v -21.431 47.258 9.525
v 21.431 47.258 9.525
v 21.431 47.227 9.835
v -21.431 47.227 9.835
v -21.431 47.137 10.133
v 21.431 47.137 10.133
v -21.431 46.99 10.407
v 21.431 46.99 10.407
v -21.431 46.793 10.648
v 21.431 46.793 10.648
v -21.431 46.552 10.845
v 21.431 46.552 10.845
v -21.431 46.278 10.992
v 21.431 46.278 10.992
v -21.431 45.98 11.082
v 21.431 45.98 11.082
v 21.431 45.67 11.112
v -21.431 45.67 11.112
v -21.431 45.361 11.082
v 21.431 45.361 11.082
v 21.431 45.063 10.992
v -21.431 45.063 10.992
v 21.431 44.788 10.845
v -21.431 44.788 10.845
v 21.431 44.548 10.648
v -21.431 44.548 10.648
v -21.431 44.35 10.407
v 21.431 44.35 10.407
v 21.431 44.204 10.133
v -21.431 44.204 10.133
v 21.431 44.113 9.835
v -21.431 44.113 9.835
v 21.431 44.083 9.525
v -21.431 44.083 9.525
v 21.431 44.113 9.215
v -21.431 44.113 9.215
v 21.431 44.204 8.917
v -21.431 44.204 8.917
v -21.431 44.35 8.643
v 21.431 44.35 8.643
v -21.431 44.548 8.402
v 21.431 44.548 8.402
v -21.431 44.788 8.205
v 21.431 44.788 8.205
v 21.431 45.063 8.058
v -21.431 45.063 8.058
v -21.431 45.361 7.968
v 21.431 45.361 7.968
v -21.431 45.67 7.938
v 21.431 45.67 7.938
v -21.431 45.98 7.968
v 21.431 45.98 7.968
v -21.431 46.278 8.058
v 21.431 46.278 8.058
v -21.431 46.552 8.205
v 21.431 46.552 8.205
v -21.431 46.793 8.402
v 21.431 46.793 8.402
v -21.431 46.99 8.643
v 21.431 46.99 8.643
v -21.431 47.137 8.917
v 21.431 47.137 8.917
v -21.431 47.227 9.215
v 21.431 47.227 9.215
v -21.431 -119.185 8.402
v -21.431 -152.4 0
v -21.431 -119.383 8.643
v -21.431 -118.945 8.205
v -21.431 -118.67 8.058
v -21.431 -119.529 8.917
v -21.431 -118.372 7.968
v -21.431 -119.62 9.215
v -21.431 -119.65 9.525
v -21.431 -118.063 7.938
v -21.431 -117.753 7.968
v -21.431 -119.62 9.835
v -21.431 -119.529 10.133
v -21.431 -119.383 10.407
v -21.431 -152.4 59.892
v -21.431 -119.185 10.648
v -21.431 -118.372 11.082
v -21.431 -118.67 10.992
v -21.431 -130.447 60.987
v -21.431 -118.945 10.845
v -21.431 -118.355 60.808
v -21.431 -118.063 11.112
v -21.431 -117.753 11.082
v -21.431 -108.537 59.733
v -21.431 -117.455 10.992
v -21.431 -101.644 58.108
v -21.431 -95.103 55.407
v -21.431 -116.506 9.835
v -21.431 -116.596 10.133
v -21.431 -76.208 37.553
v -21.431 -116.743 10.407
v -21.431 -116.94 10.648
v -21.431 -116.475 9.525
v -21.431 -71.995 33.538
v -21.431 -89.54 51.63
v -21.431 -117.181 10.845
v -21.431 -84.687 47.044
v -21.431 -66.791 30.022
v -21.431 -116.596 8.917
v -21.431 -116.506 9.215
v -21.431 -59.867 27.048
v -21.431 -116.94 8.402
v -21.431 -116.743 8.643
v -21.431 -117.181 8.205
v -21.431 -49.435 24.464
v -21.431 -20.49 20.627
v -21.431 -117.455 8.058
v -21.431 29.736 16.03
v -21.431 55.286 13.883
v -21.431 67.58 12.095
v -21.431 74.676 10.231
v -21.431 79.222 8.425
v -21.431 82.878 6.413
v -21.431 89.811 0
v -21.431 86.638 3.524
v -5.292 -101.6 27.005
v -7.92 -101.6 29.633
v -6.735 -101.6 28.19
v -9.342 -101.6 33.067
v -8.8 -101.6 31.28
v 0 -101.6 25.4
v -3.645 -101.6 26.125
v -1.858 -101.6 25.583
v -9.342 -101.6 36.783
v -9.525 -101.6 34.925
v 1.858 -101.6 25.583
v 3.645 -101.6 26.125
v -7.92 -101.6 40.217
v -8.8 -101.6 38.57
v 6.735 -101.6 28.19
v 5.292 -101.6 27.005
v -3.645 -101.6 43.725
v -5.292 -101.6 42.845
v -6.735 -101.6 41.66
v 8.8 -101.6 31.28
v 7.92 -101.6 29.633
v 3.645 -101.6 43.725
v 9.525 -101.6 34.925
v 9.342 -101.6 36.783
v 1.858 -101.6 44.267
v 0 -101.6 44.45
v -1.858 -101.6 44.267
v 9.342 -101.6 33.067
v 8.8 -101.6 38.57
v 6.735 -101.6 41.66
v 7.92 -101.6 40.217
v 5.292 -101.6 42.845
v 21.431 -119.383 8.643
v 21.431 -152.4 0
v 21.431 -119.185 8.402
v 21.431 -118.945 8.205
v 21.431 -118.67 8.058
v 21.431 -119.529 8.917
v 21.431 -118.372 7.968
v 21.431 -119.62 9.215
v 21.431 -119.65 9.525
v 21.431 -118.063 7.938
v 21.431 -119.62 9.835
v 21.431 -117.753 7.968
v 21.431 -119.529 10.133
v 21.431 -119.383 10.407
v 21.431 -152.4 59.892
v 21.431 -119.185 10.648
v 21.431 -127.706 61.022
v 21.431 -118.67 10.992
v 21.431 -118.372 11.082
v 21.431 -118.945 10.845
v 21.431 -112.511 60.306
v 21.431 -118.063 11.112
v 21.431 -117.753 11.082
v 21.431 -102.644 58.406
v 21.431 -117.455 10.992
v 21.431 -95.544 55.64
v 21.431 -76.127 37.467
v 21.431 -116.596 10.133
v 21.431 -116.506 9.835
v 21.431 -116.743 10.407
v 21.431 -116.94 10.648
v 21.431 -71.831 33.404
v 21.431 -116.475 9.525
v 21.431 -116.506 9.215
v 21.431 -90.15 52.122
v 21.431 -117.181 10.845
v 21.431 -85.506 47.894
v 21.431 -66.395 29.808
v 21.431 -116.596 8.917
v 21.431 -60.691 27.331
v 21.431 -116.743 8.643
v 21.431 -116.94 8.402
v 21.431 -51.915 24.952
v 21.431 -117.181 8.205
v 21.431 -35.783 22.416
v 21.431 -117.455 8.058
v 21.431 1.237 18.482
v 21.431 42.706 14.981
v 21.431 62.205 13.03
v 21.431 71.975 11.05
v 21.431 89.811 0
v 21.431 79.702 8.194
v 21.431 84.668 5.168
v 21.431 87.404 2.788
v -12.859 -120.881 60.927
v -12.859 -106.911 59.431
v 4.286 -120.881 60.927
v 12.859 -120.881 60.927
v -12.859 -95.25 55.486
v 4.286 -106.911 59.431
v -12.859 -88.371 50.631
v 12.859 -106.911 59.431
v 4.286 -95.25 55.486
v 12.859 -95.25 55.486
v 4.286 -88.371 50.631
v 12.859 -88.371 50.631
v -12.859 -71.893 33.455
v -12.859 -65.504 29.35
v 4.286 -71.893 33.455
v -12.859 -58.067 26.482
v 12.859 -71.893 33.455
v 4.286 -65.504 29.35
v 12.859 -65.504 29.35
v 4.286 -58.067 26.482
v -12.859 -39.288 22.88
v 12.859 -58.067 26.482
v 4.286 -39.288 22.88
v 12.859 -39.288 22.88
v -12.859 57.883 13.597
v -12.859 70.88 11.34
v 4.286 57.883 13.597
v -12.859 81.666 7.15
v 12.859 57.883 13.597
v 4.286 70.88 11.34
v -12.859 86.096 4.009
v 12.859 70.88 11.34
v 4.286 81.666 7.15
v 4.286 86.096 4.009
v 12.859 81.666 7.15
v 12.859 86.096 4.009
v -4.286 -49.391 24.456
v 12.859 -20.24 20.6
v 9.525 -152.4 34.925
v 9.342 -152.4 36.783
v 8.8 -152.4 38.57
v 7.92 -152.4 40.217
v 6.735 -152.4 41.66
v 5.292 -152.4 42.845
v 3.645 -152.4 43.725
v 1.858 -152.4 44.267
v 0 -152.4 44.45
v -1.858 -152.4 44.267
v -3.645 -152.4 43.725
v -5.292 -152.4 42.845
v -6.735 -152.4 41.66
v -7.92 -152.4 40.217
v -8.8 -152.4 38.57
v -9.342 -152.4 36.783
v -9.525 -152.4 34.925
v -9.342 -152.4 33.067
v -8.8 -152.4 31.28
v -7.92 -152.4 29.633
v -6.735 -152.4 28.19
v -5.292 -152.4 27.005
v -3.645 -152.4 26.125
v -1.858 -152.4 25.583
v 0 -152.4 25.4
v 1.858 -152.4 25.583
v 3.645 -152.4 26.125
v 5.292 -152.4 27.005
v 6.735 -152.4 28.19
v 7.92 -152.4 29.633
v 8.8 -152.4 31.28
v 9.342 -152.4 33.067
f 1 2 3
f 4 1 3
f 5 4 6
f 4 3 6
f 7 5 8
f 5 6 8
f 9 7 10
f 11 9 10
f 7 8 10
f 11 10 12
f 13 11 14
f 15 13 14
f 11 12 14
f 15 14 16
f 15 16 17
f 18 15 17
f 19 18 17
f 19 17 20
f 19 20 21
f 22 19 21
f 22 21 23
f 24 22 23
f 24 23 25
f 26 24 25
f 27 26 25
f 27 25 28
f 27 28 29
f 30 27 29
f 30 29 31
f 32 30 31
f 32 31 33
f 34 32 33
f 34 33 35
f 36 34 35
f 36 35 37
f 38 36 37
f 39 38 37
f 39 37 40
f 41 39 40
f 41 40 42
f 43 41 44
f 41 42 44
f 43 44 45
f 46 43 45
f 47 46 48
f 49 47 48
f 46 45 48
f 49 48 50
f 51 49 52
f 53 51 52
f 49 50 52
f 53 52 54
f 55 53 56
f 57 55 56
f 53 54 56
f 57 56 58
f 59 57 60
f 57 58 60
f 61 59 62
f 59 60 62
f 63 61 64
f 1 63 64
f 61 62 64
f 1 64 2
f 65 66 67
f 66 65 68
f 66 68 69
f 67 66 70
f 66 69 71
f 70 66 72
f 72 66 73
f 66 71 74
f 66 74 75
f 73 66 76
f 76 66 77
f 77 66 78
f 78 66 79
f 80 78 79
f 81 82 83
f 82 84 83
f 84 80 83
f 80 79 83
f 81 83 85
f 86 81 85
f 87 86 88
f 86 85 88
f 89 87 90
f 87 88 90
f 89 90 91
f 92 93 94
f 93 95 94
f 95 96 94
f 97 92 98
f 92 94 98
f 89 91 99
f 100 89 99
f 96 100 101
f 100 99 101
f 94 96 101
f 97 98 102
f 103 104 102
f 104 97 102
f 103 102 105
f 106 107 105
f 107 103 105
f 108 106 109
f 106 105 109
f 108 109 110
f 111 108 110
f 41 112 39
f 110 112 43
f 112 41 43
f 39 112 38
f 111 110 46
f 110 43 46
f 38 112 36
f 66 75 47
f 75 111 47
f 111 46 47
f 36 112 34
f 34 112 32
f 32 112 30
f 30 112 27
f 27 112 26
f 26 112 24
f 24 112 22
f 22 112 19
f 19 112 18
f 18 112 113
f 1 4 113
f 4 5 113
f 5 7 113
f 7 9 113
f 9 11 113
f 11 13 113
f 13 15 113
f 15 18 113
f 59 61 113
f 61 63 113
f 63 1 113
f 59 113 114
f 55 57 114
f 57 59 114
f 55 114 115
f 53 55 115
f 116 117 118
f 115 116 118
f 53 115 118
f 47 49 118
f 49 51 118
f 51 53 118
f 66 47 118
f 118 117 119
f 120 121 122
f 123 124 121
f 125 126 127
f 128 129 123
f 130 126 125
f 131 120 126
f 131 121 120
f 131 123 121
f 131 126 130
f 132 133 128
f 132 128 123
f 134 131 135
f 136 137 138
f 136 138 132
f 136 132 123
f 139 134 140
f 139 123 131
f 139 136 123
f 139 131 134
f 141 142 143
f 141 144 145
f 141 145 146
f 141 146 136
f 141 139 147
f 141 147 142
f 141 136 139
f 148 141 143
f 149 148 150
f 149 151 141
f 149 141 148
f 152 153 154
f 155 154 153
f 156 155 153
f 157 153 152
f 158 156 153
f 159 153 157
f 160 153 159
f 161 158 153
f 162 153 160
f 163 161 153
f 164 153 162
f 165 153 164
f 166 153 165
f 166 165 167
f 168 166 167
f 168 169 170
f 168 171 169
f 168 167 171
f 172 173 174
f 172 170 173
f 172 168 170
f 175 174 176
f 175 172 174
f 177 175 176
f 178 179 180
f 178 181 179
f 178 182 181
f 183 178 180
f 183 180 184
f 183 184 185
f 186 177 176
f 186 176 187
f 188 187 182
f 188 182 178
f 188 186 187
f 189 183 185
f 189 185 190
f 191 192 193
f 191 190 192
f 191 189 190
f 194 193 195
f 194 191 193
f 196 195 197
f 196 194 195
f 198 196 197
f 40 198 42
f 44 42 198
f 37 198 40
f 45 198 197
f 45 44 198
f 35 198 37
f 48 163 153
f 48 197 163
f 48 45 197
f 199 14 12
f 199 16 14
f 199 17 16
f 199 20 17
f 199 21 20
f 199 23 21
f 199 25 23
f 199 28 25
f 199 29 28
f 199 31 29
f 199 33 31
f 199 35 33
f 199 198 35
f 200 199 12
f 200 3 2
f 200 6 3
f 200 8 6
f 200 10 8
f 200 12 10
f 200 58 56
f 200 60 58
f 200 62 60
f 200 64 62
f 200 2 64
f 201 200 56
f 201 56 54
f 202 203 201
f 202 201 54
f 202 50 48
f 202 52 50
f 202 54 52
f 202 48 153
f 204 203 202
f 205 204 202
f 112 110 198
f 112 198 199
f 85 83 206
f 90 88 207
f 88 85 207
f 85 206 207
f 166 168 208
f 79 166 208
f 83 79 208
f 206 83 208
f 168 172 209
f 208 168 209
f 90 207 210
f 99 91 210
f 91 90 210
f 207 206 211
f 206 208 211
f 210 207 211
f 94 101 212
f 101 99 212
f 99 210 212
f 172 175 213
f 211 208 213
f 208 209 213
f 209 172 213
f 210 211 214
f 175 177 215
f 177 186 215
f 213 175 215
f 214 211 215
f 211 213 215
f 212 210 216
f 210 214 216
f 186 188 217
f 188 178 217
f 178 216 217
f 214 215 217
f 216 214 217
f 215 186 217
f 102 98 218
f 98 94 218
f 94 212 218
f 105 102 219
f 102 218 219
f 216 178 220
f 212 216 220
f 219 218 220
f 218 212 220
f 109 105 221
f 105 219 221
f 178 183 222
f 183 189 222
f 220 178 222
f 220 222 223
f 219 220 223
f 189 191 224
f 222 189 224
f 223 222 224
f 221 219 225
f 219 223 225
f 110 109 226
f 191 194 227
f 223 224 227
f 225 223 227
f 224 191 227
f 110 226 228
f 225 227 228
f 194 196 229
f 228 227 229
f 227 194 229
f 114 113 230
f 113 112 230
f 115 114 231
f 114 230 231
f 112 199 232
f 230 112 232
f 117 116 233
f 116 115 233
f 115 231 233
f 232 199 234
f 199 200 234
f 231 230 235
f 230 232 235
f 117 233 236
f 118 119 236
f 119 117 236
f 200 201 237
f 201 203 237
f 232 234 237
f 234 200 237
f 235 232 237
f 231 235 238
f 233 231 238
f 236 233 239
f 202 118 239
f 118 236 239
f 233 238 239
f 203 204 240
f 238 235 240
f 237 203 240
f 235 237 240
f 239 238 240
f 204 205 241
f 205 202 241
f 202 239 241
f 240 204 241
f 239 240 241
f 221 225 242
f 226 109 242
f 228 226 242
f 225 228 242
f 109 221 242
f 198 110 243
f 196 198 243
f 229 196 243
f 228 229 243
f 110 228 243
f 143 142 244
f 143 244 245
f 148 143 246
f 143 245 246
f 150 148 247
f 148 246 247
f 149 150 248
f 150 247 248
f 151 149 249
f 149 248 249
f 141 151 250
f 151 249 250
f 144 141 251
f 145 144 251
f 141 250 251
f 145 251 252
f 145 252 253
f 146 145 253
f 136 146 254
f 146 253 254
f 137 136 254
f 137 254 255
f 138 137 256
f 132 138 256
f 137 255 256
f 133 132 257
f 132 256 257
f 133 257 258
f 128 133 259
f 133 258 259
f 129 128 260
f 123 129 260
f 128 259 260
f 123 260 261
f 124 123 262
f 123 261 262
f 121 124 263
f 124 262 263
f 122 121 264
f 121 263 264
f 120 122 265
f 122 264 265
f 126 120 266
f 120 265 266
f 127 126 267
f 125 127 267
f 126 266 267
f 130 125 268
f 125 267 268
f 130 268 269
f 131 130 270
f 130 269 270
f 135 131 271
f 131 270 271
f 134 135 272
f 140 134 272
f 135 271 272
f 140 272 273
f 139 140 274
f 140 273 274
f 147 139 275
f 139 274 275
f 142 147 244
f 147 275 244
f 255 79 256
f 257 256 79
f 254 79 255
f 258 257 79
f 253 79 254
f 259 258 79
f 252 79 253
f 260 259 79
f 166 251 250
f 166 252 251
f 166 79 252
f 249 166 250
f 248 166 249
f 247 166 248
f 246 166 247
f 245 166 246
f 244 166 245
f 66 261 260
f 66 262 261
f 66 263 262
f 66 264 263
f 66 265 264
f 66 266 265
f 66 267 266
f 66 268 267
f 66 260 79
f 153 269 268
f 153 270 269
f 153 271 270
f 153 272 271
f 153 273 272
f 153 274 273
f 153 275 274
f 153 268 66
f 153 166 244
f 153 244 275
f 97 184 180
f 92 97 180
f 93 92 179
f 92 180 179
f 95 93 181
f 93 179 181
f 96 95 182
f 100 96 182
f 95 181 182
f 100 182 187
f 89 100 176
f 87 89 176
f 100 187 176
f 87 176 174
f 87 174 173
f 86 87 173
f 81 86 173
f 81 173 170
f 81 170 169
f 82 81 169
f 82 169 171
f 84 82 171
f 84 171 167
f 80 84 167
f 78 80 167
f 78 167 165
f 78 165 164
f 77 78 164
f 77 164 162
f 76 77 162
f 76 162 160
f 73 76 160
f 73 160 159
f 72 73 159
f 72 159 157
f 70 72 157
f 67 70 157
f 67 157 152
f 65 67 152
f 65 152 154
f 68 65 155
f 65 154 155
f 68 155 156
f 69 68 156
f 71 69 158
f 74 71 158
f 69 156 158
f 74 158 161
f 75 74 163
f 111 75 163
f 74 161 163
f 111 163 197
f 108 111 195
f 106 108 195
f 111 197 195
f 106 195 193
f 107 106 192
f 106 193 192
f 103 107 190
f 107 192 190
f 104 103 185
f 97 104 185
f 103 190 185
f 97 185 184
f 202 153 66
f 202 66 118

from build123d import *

# Parameters (mm, degrees)
F1_DEPTH = 21.43125
F2_R     = 9.525
F3_DEPTH = 50.8
F4_R     = 1.5875
F5_DEPTH = 42.8635


with BuildPart() as f1:
    # F0 (on Right) → F1 (new body, symmetric)
    with BuildSketch(Plane.YZ):
        Polygon((-152.4, 69.85), (-152.4, 0), (152.4, 0), (152.4, 19.05), align=None)
    extrude(amount=F1_DEPTH, both=True)

    # F2 (on face) → F3 (cut)
    with BuildSketch(Plane.XZ.offset(152.4)):
        with Locations((0, 34.925)):
            Circle(F2_R)
    extrude(amount=-F3_DEPTH, mode=Mode.SUBTRACT)

    # F4 (on face) → F5 (intersect, through all)
    with BuildSketch(Plane.YZ.offset(21.43125)):
        with BuildLine():
            add(Edge.make_bspline(
                [(-152.4, 59.8916597664), (-130.9144296082, 61.2657508415), (-92.3976667916, 63.8561474475), (-73.8563754206, 29.0422208261), (-37.9533960618, 21.5511524571), (41.586464074, 15.0183648964), (80.9038296317, 11.9636732436), (89.8114517331, 0)],
                knots=[0, 0, 0, 0, 0.1938043349, 0.3388534363, 0.4887234603, 0.7216195473, 0.9008792926, 0.9008792926, 0.9008792926, 0.9008792926], degree=3))
            Line((-152.4, 59.8916597664), (-152.4, 0))
            Line((-152.4, 0), (89.8114517331, 0))
        make_face()
        with Locations((-118.0625930429, 9.525)):
            Circle(F4_R, mode=Mode.SUBTRACT)
        with Locations((45.6703007221, 9.525)):
            Circle(F4_R, mode=Mode.SUBTRACT)
    extrude(amount=-F5_DEPTH, mode=Mode.INTERSECT)


solid = f1.part
